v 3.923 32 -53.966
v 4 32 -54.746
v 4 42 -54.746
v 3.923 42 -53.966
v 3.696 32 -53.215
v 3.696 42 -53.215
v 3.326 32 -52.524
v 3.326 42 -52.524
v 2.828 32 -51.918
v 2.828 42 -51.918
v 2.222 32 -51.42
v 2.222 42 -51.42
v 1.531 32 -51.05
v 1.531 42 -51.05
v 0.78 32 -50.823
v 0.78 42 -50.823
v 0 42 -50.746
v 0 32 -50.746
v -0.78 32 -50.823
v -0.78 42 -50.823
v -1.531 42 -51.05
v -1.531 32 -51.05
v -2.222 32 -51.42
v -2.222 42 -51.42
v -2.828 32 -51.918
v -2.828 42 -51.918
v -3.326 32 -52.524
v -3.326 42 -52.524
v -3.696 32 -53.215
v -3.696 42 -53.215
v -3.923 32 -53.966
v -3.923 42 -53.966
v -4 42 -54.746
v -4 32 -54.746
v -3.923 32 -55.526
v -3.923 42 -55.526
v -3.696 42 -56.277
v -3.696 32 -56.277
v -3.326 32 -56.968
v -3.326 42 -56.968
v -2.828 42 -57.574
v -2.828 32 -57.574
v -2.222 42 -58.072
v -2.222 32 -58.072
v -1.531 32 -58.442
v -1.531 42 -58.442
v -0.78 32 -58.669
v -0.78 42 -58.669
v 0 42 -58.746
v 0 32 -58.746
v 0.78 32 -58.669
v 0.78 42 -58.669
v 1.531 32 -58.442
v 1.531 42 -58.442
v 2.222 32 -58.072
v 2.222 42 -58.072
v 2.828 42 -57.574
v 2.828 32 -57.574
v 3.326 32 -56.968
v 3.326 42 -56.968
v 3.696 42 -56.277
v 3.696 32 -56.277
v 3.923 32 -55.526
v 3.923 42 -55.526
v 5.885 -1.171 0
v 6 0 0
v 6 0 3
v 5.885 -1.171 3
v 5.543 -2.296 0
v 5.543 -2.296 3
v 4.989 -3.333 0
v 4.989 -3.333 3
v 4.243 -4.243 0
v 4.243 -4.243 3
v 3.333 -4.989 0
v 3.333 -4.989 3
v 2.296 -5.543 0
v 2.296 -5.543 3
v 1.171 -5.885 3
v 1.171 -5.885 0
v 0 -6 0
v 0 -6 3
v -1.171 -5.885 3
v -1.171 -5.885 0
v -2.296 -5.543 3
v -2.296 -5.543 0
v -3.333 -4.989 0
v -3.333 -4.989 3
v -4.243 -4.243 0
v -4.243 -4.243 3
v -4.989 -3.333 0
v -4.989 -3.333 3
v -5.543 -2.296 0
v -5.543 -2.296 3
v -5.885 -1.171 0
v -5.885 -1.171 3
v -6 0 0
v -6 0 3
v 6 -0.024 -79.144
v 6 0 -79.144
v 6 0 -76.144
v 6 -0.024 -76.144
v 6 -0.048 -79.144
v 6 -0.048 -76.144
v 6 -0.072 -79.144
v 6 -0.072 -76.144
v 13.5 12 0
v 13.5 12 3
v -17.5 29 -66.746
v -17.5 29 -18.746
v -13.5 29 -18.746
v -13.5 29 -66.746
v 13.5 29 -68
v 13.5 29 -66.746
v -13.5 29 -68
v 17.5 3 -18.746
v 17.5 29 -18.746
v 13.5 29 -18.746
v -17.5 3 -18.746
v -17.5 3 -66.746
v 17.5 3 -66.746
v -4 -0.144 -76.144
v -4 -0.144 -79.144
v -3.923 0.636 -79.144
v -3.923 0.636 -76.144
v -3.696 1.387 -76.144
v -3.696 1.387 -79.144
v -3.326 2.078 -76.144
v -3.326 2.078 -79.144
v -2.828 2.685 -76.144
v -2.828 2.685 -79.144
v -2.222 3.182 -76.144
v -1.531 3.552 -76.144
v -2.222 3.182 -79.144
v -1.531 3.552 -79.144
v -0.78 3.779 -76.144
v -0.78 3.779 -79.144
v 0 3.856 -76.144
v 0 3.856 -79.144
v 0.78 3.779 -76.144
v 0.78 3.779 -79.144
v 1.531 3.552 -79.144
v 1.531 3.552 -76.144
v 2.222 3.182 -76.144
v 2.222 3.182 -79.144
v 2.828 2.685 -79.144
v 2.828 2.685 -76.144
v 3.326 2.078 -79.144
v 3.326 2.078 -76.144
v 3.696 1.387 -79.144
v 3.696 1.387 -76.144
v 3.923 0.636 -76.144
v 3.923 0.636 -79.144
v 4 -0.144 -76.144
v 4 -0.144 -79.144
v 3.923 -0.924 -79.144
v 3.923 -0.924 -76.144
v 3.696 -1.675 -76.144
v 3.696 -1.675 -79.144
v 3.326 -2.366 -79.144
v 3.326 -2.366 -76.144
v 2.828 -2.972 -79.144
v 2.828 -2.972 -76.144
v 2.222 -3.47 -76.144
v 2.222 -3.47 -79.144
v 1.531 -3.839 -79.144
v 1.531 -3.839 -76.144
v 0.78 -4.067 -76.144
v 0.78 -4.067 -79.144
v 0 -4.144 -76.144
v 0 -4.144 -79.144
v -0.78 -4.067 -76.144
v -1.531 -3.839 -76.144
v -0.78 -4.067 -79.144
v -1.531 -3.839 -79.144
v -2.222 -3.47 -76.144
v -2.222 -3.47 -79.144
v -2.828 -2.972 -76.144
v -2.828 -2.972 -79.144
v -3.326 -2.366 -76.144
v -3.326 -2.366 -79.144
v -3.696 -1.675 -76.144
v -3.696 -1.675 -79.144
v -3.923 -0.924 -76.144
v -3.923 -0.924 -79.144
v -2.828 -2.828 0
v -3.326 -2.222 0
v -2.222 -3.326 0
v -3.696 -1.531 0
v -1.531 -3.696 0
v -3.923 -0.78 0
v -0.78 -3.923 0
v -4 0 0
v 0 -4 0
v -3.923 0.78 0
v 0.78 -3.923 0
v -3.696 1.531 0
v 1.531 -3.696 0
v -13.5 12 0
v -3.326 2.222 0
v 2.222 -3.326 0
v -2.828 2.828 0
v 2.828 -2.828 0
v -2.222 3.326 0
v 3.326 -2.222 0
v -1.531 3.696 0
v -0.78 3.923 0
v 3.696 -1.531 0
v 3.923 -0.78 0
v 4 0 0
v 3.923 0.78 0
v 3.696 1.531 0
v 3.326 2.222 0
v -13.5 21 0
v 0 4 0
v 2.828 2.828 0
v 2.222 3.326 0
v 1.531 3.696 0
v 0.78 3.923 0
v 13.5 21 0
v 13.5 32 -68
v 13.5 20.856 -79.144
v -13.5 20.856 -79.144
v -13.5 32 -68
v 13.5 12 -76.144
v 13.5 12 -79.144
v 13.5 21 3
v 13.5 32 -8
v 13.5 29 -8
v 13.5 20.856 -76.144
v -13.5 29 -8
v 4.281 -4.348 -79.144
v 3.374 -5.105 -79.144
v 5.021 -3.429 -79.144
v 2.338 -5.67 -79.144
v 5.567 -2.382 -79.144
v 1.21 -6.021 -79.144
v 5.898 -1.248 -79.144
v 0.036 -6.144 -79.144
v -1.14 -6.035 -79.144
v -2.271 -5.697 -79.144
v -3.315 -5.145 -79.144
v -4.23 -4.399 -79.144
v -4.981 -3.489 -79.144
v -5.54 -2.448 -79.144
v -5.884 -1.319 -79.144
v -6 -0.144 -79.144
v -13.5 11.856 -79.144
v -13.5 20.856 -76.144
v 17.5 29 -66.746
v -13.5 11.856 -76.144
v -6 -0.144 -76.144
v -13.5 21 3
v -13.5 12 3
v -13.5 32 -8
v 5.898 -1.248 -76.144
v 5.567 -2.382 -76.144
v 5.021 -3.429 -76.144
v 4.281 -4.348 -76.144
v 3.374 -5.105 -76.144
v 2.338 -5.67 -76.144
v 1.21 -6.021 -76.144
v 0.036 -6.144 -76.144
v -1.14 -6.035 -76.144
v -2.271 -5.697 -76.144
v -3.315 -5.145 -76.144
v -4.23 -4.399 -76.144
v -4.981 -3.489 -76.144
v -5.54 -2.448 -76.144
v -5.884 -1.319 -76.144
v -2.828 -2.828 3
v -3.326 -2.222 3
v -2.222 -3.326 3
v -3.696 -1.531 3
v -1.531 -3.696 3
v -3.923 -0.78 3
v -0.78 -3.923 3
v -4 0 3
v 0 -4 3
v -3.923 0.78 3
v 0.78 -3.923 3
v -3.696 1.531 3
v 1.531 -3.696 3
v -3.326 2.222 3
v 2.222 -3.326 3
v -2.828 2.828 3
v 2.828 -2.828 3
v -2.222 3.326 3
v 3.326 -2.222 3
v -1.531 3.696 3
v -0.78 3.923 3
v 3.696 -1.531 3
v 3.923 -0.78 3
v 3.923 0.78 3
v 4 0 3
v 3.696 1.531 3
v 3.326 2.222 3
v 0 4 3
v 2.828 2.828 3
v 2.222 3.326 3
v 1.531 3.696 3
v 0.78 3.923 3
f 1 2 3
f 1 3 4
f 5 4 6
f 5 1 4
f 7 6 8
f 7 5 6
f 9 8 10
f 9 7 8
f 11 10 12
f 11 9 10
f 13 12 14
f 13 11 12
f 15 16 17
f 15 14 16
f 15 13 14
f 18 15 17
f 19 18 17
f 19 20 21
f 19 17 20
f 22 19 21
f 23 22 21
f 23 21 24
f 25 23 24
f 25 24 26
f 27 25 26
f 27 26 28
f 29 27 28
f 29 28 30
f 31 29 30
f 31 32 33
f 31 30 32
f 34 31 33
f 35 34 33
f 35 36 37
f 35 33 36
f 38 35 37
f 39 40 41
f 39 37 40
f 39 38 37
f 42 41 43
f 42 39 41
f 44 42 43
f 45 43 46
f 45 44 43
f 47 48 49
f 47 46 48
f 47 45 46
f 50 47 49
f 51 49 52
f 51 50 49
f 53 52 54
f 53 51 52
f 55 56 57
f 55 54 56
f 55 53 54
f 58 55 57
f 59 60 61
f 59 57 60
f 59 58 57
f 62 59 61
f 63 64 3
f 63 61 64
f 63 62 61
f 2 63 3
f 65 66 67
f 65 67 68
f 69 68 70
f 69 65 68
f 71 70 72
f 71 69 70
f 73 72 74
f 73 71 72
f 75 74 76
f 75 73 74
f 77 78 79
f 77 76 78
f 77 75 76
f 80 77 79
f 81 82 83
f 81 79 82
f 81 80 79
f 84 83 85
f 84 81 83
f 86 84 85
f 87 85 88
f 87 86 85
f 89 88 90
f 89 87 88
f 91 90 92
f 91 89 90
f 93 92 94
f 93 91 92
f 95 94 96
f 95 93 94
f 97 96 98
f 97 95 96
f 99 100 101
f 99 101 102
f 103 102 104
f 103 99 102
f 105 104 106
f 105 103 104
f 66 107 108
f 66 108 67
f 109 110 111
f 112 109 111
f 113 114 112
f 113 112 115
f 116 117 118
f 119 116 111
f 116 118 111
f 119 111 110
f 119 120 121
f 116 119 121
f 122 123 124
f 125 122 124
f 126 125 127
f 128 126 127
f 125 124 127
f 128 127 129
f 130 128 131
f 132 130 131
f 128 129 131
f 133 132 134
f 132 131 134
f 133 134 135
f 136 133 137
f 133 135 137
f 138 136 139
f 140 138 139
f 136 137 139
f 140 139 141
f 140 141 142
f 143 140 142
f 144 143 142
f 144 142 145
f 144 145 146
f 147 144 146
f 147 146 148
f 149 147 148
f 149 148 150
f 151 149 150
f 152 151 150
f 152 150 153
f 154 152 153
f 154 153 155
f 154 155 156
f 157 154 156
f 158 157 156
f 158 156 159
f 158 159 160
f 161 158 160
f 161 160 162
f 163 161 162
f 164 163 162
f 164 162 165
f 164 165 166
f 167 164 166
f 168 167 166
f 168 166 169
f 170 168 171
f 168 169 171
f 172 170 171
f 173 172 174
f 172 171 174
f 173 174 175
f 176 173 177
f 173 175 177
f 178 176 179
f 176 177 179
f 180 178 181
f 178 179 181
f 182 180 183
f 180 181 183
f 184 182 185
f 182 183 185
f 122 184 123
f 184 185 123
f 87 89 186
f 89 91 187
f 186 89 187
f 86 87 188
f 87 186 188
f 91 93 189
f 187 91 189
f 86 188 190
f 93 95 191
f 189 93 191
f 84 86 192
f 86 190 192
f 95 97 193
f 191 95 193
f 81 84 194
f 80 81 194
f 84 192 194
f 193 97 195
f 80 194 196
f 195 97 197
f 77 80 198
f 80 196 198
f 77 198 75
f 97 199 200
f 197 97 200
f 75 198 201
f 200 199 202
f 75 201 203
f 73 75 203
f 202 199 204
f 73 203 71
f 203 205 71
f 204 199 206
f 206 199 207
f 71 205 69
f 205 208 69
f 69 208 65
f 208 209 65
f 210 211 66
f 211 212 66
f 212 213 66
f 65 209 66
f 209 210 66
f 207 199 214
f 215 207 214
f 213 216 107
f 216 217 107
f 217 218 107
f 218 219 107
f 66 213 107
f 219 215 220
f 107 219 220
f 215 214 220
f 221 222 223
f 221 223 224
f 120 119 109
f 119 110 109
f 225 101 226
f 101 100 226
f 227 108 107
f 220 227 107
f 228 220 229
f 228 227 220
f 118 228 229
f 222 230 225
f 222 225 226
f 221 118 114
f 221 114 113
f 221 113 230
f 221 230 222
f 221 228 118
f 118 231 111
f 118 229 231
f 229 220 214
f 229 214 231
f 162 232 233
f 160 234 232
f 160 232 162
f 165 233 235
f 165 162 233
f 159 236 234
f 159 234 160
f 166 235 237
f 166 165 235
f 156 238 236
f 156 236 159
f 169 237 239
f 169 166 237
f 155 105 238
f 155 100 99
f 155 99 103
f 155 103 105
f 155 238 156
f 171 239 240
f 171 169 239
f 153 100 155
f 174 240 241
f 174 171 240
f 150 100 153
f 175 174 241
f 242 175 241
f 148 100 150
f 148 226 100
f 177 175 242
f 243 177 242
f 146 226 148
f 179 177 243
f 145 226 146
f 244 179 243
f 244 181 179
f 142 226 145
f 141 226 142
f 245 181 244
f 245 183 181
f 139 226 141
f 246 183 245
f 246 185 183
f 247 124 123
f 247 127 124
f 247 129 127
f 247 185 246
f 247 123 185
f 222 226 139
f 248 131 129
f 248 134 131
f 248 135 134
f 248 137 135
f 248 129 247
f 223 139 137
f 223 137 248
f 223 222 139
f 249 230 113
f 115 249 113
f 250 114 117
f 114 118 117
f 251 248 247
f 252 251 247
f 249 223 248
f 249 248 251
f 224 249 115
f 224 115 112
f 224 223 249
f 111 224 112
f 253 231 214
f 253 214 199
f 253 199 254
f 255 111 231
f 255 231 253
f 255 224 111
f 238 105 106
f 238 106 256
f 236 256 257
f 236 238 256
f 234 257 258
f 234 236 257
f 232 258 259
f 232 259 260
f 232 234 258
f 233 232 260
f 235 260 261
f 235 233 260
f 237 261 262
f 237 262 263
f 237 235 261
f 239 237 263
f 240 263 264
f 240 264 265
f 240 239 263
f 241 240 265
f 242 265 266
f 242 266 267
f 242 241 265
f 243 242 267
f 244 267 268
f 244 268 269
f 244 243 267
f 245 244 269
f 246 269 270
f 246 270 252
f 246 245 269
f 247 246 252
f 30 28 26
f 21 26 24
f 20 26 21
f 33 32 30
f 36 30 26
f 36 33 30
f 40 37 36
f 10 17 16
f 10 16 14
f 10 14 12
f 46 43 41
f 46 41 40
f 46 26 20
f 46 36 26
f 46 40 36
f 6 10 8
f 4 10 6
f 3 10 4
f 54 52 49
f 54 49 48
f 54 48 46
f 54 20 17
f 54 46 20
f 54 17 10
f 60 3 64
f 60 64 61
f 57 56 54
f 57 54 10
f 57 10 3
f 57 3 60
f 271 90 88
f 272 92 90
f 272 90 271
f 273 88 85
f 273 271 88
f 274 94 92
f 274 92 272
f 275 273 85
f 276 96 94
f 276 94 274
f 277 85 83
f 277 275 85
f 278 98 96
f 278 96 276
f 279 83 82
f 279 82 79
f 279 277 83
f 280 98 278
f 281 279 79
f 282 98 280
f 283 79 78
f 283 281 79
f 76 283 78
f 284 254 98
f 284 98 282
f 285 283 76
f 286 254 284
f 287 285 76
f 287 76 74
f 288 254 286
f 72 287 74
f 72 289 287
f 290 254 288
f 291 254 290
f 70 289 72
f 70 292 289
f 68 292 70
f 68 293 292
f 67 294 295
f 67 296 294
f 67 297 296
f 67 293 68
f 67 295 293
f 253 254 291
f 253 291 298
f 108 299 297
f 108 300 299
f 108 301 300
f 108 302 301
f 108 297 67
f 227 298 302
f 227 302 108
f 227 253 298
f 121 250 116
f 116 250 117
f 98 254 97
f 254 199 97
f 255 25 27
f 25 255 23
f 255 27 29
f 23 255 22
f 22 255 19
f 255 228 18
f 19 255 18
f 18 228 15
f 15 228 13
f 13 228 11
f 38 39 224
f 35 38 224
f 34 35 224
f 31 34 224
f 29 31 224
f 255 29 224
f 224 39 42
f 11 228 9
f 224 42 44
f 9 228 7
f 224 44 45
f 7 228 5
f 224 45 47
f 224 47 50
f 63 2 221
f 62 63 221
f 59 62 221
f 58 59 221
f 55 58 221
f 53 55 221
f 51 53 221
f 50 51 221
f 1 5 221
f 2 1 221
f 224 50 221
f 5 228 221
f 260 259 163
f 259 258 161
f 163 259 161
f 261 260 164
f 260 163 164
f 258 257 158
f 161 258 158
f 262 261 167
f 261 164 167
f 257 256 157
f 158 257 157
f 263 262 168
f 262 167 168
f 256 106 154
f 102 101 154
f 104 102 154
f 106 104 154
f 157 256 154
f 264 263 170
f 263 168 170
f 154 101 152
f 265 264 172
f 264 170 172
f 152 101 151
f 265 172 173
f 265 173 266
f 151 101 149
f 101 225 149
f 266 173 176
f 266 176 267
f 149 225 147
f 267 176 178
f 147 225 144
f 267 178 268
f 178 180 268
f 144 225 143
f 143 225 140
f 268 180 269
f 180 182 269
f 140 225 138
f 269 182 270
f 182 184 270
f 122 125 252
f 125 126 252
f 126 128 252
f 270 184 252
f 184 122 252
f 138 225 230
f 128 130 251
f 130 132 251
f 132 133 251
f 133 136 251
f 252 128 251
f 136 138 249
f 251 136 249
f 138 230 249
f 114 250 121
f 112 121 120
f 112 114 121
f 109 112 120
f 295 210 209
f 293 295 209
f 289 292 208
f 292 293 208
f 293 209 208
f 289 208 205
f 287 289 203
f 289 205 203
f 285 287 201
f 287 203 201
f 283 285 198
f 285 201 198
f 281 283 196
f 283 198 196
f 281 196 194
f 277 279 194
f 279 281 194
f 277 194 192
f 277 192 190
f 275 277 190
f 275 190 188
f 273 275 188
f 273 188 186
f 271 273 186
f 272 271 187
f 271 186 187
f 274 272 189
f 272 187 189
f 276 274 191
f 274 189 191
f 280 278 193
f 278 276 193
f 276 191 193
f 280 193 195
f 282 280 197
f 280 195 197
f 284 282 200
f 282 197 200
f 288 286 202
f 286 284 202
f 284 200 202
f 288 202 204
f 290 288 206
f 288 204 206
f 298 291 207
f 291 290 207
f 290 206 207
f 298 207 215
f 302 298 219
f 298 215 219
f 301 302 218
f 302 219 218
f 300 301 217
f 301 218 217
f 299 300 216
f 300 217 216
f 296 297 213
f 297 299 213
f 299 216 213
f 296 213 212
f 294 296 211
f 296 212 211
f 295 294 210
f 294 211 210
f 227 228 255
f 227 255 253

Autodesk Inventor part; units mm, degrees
ref_plane "YZ Plane" through (0, 0, 0) normal (1, 0, 0) x (0, 1, 0)
ref_plane "XZ Plane" through (0, 0, 0) normal (0, 1, 0) x (-1, 0, 0)
ref_plane "XY Plane" through (0, 0, 0) normal (0, 0, 1) x (1, 0, 0)
sketch "Sketch1" plane through (0, 0, 0) normal (0, 0, 1) x (1, 0, 0)
  circle A0 centre (0, 0) radius 4
  arc A1 (-6, 0) -> (6, 0) centre (0, 0) ccw
  line L0 (0, 21) -> (13.5, 21)
  line L1 (13.5, 21) -> (-13.5, 21)
  line L2 (-13.5, 21) -> (-13.5, 12)
  line L3 (-13.5, 12) -> (-6, 0)
  line L4 (13.5, 21) -> (13.5, 12)
  line L5 (13.5, 12) -> (6, 0)
  dimension "d0" = 8
  dimension "d1" = 12
  dimension "d2" = 21
  dimension "d3" = 13.5
  dimension "d4" = 27
  dimension "d5" = 9
  dimension "d6" = 9
extrude "Extrusion1" add sketch "Sketch1" along normal blind 3
sketch "Sketch2" plane through (13.5, 12, 0) normal (1, 0, 0) x (0, 0, -1)
  line L0 (8, 20) -> (-3, 9)
  line L1 (8, 20) -> (68, 20)
  line L2 (79, 9) -> (68, 20)
  line L3 (0, 9) -> (-3, 9) projected
  line L4 (-3, 9) -> (0, 9)
  line L5 (0, 9) -> (8, 17)
  line L6 (79.1439, 8.8561) -> (76.1439, 8.8561)
  line L7 (76.1439, 8.8561) -> (68, 17)
  line L8 (39.224, 17) -> (8, 17)
  line L9 (39.224, 17) -> (68, 17)
  line L10 (-3, 0) -> (-3, -12) projected
  line L11 (8, 17) -> (68, 17)
  line L12 (-3, 9) -> (0, 9)
  line L13 (0, 9) -> (8, 17)
  line L14 (8, 17) -> (68, 17)
  line L15 (76.1439, 8.8561) -> (79.1439, 8.8561)
  line L16 (79.1439, 8.8561) -> (68, 20)
  line L17 (68, 20) -> (8, 20)
  line L18 (8, 20) -> (-3, 9)
  line L19 (-3, 9) -> (0, 9)
  point P0 (0, -12)
  dimension "d11" = 60
  dimension "d14" = 3
extrude "Extrusion2" add sketch "Sketch2" against normal blind 27
sketch "Sketch3" plane through (13.5, 20.8561, -79.1439) normal (0, -1, 0) x (1, 0, 0)
  line L0 (0, 0) -> (-27, 0) projected
  line L1 (0, 0) -> (-27, 0)
  line L2 (0, 3) -> (-27, 3) projected
  line L3 (-27, 0) -> (-27, 3)
  line L4 (-27, 3) -> (0, 3)
  line L5 (0, 3) -> (0, 0)
  point P0 (-13.5, 79.1439)
extrude "Extrusion3" add sketch "Sketch3" along normal blind 45
sketch "Sketch4" plane through (13.5, 29, -68) normal (0, -1, 0) x (1, 0, 0)
  line L0 (0, 0) -> (0, 60) projected
  line L1 (0, 1.254) -> (-27, 1.254)
  line L2 (-27, 0) -> (-27, 60) projected
  line L3 (0, 1.254) -> (-13.5, 1.254)
  line L4 (-13.5, 1.254) -> (4, 1.254)
  line L5 (4, 1.254) -> (4, 49.254)
  line L6 (4, 49.254) -> (-31, 49.254)
  line L7 (-31, 49.254) -> (-31, 1.254)
  line L8 (-31, 1.254) -> (4, 1.254)
  point P0 (-13.5, 68)
  dimension "d20" = 1.254
  dimension "d21" = 17.5
  dimension "d22" = 48
  dimension "d23" = 35
extrude "Extrusion4" add sketch "Sketch4" along normal blind 26
sketch "Sketch5" plane through (13.5, 32, -8) normal (0, 1, 0) x (1, 0, 0)
  line L0 (-27, 0) -> (-27, 60) projected
  line L1 (0, 60) -> (-27, 60) projected
  circle A0 centre (-13.5, 46.746) radius 4
  point P0 (-13.5, -8)
  dimension "d28" = 8
extrude "Extrusion5" add sketch "Sketch5" along normal blind 10
sketch "Sketch6" plane through (13.5, 20.8561, -79.1439) normal (0, 0, -1) x (-1, 0, 0)
  circle A0 centre (13.5, -21) radius 4
  arc A1 (7.5004, -20.9281) -> (19.4996, -20.9281) centre (13.5, -21) ccw
  line L0 (27, -9) -> (19.5, -21)
  line L1 (7.5, -20.8561) -> (0, -8.8561) projected
  line L2 (0, -8.8561) -> (7.5, -20.8561)
  line L3 (27, 0) -> (27, -45) projected
  line L4 (27, -9) -> (27, -45)
  line L5 (0, -45) -> (27, -45) projected
  line L6 (27, -45) -> (0, -45)
  line L7 (0, -45) -> (0, -8.8561)
  arc A2 (7.5, -20.8561) -> (19.5, -20.8561) centre (13.5, -20.8561) ccw projected
  arc A3 (7.5, -20.8561) -> (19.5, -20.8561) centre (13.5, -21) ccw
  point P0 (0, 0.1439)
  dimension "d34" = 8
  dimension "d35" = 12
extrude "Extrusion6" cut sketch "Sketch6" against normal blind 4 contours A0 | A1 L0 L3 L5 L7 L1 A2
properties part number "Cversion2"
